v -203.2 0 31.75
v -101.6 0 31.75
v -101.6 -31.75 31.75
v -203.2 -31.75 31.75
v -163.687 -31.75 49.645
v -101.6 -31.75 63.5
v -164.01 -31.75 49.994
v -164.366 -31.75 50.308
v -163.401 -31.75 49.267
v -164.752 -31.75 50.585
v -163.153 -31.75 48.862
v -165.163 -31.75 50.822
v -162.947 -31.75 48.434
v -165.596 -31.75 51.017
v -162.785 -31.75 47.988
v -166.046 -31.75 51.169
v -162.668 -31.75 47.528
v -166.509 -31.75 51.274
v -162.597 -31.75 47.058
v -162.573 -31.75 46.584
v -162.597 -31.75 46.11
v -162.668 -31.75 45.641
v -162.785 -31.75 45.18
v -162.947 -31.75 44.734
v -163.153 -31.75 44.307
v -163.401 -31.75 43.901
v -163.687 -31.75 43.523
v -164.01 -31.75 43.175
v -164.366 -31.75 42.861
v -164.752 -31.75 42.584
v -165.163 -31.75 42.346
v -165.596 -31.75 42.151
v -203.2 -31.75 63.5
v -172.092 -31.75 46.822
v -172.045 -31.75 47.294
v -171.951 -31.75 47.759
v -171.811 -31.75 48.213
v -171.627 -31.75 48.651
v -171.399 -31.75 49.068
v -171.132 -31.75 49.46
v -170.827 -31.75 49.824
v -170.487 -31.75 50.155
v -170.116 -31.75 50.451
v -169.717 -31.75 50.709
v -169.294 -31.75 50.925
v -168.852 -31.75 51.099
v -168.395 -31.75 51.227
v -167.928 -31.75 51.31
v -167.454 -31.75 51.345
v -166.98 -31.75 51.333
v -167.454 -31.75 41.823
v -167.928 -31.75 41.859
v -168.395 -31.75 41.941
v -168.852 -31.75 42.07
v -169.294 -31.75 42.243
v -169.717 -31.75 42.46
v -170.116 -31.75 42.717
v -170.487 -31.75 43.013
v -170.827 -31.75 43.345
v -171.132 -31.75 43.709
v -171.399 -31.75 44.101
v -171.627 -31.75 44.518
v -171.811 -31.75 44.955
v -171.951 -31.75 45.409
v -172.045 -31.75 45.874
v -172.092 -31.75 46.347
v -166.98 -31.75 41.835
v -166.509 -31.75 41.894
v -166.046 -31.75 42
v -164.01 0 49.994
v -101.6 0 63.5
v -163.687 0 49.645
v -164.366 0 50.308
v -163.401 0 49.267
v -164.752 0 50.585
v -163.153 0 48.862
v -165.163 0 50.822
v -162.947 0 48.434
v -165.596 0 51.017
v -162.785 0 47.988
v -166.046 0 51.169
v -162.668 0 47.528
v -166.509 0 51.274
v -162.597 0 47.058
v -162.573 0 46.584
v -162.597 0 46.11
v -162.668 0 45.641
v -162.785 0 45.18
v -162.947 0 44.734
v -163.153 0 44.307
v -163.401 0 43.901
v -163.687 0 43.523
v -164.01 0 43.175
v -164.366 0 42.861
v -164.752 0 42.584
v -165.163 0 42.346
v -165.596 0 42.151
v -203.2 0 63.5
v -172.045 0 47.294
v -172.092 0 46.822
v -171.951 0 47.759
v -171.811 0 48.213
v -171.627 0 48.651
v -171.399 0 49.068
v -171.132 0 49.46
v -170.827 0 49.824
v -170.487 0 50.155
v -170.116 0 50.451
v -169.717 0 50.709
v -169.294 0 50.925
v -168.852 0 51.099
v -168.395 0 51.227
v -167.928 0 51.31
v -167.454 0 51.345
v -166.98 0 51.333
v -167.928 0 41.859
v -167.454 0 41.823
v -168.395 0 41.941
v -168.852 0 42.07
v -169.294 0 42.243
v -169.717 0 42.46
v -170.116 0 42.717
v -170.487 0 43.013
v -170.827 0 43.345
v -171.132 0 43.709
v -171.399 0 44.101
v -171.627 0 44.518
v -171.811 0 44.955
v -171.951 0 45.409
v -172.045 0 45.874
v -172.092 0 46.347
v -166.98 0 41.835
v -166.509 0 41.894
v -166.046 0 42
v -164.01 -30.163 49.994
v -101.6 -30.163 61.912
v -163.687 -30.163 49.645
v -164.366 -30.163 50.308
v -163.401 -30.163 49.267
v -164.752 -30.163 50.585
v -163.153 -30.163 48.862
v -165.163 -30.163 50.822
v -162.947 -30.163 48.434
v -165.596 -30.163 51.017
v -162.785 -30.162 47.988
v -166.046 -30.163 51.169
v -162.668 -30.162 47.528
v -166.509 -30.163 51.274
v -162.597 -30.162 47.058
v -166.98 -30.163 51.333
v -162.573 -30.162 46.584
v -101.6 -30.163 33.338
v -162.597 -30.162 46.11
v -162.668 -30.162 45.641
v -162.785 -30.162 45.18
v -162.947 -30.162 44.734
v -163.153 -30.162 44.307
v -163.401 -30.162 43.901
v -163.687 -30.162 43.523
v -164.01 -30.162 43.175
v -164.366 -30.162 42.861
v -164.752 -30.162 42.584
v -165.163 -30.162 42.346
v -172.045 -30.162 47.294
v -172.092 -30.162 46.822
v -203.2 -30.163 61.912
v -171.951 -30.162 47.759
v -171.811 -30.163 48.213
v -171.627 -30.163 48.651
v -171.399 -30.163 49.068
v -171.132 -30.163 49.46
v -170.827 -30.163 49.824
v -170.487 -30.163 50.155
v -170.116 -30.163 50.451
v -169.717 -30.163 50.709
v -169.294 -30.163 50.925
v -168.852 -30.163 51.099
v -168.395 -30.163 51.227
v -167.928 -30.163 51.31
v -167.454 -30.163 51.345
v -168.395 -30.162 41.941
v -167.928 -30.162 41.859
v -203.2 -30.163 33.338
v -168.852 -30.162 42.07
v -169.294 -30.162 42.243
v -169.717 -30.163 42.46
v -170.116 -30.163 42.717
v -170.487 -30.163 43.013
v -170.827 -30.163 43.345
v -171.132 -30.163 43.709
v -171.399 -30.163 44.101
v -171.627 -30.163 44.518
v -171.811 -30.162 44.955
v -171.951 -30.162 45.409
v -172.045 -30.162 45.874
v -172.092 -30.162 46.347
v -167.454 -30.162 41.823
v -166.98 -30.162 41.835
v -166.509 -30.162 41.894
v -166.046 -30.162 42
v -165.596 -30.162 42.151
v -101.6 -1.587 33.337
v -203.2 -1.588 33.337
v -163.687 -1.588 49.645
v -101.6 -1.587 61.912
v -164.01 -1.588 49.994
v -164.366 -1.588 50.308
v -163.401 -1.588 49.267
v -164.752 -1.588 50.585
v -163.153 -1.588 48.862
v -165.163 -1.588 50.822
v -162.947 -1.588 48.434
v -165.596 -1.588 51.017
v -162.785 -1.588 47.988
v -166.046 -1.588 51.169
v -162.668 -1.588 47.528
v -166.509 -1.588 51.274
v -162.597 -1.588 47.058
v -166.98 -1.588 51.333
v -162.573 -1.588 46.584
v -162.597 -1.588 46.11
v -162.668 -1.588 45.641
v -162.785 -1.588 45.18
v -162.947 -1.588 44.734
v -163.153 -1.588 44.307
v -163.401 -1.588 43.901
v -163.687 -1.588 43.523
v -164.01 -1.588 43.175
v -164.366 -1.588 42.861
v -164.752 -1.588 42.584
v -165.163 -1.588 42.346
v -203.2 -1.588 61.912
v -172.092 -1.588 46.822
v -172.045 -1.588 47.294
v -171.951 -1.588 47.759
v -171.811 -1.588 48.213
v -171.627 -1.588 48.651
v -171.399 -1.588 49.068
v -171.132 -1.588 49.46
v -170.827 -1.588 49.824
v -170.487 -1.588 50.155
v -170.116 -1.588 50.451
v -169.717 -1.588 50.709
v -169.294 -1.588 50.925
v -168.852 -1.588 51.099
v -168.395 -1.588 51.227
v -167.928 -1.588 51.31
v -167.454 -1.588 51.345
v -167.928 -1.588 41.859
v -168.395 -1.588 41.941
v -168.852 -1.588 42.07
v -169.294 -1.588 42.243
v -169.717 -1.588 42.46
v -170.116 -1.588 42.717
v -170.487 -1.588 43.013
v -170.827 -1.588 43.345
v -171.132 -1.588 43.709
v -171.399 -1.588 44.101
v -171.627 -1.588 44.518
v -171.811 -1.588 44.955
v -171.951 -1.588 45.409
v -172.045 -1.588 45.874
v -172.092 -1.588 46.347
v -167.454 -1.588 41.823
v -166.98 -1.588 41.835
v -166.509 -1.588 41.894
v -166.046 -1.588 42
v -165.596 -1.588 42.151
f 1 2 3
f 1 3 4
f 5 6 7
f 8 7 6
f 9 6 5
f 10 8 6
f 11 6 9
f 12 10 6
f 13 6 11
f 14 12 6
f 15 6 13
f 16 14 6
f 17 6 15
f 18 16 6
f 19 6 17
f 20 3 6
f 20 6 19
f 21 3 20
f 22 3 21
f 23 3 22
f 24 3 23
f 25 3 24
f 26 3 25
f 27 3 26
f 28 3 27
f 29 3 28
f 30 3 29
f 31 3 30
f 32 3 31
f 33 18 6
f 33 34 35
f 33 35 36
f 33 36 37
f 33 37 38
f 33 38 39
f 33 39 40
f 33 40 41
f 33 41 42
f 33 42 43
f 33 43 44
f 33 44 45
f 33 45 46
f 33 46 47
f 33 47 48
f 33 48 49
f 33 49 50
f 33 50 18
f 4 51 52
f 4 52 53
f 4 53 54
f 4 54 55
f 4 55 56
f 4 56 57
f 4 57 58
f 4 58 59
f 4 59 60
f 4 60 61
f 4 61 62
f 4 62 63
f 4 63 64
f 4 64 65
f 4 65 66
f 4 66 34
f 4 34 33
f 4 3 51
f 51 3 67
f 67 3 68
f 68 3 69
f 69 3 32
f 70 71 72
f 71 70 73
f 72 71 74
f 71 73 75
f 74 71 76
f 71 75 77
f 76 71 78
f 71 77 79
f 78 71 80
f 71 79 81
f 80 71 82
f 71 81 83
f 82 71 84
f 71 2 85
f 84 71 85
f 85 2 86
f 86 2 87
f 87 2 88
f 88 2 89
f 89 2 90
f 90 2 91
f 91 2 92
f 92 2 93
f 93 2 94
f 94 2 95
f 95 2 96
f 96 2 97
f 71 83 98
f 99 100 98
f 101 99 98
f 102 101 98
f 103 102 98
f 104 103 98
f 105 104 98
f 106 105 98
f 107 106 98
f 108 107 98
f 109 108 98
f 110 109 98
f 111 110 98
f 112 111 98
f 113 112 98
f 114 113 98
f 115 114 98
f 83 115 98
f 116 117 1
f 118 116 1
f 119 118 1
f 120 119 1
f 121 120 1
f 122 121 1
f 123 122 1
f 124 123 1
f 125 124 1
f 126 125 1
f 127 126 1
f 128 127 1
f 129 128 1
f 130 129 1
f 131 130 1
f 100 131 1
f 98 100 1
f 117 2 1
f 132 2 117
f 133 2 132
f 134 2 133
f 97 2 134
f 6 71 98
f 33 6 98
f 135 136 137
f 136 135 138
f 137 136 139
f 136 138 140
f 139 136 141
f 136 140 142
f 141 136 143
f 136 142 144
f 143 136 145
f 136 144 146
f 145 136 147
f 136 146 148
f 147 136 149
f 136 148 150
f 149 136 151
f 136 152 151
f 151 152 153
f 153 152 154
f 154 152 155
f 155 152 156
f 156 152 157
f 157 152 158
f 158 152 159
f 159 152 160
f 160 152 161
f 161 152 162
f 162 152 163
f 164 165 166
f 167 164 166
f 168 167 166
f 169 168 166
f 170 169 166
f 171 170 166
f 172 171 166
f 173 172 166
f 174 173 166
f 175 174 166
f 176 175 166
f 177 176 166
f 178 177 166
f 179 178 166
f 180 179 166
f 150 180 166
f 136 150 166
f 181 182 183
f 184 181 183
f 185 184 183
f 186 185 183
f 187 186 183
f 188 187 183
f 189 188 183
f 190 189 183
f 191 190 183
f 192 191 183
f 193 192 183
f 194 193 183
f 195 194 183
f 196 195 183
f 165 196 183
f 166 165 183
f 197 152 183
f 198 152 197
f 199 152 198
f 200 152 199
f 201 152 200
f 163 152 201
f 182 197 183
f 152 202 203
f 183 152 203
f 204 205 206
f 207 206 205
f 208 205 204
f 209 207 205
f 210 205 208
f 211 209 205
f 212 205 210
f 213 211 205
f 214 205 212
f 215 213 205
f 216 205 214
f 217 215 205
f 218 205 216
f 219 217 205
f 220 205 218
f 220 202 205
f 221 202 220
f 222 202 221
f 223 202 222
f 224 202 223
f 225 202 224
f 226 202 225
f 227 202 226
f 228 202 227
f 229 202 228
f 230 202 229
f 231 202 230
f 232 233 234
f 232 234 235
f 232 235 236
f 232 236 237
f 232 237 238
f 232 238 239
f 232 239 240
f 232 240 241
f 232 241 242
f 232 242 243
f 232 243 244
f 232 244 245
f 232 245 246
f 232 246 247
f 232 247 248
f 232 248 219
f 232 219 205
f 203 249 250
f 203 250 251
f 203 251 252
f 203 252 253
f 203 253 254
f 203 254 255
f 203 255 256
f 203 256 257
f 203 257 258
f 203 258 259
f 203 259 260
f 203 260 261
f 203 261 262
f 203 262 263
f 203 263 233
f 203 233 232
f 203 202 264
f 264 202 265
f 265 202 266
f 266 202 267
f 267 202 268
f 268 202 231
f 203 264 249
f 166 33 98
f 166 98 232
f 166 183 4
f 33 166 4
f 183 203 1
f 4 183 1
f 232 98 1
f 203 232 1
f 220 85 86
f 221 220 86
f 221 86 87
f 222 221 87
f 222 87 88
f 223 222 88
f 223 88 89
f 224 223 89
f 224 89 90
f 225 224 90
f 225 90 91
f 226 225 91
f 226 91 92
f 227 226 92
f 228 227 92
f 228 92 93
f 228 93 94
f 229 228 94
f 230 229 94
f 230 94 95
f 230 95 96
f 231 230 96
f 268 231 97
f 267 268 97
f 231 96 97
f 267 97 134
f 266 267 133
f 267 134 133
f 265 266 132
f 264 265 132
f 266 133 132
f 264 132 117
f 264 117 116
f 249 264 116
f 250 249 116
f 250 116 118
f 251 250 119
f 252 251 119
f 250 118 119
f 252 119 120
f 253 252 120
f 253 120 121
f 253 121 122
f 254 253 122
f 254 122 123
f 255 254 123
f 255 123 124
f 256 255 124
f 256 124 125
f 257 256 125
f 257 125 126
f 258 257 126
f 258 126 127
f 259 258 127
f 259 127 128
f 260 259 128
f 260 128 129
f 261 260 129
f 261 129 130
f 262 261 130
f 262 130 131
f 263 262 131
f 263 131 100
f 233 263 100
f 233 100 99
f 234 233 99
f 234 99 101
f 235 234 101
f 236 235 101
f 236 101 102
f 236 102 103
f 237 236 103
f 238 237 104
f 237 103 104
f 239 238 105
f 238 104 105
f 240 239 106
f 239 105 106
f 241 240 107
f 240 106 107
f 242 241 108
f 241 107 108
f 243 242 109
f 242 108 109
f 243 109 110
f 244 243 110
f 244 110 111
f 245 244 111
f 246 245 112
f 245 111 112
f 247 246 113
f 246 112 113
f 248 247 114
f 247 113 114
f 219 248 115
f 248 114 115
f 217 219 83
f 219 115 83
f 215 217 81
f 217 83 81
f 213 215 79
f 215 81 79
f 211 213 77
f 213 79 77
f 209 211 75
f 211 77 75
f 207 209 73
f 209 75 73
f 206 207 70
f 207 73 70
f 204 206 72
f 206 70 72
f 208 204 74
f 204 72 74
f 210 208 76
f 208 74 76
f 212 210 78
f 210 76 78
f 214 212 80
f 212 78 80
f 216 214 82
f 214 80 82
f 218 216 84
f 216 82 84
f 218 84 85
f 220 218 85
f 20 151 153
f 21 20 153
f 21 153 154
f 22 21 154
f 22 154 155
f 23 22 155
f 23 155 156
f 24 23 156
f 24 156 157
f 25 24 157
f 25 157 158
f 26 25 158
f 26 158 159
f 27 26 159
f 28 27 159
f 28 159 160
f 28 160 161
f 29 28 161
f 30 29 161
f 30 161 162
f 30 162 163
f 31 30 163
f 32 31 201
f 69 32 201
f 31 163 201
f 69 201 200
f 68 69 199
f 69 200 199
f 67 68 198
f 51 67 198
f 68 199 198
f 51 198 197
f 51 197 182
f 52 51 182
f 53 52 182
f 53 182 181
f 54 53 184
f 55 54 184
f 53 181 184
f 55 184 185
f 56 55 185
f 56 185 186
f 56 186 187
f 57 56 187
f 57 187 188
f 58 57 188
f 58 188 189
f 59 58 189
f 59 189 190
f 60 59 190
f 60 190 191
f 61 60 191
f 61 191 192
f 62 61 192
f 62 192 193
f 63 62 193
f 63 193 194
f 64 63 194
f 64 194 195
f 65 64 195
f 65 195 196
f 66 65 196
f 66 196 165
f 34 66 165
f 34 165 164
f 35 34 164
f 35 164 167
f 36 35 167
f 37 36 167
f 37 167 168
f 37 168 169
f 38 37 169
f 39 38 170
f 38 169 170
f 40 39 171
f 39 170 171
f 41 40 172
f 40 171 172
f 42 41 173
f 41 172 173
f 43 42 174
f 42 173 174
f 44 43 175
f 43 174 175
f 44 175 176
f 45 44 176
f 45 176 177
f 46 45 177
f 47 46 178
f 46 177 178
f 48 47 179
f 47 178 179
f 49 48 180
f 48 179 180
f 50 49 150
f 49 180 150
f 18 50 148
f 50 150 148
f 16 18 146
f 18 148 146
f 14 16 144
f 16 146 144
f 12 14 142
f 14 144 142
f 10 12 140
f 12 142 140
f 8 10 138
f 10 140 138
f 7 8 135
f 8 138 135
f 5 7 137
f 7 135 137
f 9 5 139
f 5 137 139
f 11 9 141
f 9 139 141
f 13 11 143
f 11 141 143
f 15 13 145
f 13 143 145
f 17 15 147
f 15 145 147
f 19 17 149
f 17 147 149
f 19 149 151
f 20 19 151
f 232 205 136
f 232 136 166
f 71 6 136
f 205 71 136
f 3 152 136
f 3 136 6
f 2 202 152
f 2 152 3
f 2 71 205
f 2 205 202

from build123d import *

# Parameters (mm, degrees)
F0_W     = 101.6
F0_H     = 31.75
F1_DEPTH = 31.75
F2_T     = -1.5875
F4_D     = 9.525
F5_ANGLE = 90
F6_ANGLE = 180


with BuildPart() as f1:
    # F0 (on Top) → F1 (new body)
    with BuildSketch(Plane.XY):
        with Locations((-50.8, 15.875)):
            Rectangle(F0_W, F0_H)
    extrude(amount=F1_DEPTH)

    # F2
    f2_openings = [f1.faces().sort_by_distance(p)[0] for p in [
        (-101.6, 15.875, 15.875),
        (0, 15.875, 15.875),
    ]]
    offset(amount=F2_T, openings=f2_openings)

    # F4 (through all)
    with Locations(Plane.XY.offset(31.75)):
        with Locations((-35.8643569052, 16.9158093631)):
            Hole(F4_D / 2)


with BuildPart() as f1_1:
    # F5: moved
    add(f1.part.rotate(Axis((-50.8, 31.75, 31.75), (-1, 0, 0)), F5_ANGLE))


with BuildPart() as f1_2:
    # F6: moved
    add(f1_1.part.rotate(Axis((-101.6, 0, 47.625), (0, 0, -1)), F6_ANGLE))


solid = f1_2.part
